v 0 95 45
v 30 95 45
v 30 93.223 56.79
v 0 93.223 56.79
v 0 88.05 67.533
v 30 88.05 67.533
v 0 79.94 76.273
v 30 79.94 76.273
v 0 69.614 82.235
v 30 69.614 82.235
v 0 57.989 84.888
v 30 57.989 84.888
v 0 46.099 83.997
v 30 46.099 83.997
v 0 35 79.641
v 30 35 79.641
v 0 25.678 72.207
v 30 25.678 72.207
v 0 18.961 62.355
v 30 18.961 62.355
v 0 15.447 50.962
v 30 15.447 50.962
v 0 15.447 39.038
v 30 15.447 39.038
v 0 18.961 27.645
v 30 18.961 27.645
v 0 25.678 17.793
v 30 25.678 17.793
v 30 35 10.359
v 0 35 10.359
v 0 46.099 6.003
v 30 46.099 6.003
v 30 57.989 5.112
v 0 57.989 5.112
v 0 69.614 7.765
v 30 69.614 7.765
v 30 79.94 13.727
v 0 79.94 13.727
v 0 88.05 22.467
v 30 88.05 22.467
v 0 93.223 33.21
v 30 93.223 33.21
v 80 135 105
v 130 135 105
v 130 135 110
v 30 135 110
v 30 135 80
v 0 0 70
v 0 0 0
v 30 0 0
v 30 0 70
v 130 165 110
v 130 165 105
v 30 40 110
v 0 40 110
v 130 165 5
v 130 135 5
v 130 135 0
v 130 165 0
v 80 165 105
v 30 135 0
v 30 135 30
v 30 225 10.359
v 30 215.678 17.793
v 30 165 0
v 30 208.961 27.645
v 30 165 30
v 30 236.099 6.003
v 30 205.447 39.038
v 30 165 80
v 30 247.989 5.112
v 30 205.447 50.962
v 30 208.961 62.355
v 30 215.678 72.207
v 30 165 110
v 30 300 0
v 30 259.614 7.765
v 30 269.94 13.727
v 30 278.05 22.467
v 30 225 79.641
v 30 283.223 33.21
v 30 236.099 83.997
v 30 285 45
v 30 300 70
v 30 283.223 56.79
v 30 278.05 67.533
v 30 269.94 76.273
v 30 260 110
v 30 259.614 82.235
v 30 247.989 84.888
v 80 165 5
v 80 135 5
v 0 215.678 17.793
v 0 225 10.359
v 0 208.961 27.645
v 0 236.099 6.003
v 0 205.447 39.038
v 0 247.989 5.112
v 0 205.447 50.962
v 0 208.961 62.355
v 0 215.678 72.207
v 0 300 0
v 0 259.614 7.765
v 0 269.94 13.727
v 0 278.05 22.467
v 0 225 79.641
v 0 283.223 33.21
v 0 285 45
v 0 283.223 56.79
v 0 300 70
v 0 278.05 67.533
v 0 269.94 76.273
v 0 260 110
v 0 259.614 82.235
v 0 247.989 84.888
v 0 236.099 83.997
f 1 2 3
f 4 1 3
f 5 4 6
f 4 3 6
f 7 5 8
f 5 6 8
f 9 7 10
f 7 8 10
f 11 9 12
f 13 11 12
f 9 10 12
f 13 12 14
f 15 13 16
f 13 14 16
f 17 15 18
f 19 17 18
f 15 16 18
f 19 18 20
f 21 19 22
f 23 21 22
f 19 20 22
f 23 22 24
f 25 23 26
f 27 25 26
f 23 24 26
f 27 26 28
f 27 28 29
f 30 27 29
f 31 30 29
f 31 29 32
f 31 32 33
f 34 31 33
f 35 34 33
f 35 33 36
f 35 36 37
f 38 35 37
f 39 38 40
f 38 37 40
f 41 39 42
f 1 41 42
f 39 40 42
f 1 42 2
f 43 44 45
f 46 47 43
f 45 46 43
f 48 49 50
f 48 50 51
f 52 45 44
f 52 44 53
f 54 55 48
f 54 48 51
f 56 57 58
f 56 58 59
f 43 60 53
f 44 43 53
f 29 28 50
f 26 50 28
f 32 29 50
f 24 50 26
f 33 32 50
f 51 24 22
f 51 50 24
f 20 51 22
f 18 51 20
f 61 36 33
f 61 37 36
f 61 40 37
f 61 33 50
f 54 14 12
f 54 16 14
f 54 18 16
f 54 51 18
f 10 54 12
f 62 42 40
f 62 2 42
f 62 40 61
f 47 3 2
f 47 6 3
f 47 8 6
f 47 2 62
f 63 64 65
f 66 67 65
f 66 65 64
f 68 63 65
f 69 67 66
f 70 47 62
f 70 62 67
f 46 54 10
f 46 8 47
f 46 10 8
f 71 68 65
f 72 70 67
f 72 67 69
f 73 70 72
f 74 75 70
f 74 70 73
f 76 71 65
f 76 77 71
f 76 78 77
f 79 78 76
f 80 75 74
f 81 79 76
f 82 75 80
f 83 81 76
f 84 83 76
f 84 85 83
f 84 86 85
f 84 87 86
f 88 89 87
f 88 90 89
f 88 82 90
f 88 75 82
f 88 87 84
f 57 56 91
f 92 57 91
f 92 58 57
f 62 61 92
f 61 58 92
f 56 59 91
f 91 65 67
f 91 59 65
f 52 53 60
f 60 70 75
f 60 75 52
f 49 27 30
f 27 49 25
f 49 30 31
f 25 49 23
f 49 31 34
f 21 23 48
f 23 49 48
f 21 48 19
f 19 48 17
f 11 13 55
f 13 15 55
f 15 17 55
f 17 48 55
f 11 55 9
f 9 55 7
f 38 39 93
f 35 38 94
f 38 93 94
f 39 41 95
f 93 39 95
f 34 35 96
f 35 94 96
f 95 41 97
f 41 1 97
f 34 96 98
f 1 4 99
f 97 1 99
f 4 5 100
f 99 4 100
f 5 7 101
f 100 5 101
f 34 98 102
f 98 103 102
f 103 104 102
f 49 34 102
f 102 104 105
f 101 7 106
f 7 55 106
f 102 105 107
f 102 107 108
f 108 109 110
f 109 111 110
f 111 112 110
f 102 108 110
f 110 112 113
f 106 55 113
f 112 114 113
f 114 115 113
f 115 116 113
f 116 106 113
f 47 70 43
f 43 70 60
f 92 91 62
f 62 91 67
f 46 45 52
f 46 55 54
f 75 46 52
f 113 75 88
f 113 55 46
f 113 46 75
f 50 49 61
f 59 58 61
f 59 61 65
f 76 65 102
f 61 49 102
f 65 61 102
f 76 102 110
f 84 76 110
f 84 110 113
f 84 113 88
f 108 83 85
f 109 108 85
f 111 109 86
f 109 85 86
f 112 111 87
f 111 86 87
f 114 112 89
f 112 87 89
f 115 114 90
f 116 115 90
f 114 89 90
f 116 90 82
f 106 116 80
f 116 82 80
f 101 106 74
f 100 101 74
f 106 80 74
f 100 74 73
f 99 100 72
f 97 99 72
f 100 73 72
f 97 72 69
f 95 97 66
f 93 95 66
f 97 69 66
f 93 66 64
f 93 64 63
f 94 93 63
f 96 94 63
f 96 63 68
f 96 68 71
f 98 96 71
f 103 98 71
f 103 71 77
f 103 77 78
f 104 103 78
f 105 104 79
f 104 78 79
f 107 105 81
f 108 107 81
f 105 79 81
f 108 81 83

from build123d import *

# Parameters (mm, degrees)
F0_W     = 300
F0_H     = 110
F1_DEPTH = 30
F2_R     = 40
F3_DEPTH = 30
F4_W     = 30
F4_H     = 30
F5_DEPTH = 100
F7_DEPTH = 30
F8_SIZE  = 40


with BuildPart() as f1:
    # F0 (on Right) → F1 (new body)
    with BuildSketch(Plane.YZ):
        with Locations((150, 55)):
            Rectangle(F0_W, F0_H)
    extrude(amount=F1_DEPTH)

    # F2 (on face) → F3 (cut, through all)
    with BuildSketch(Plane.YZ.offset(30)):
        with Locations((55, 45)):
            Circle(F2_R)
        with Locations((245, 45)):
            Circle(F2_R)
    extrude(amount=-F3_DEPTH, mode=Mode.SUBTRACT)

    # F4 (on face) → F5 (join)
    with BuildSketch(Plane.YZ.offset(30)):
        with Locations((150, 95)):
            Rectangle(F4_W, F4_H)
        with Locations((150, 15)):
            Rectangle(F4_W, F4_H)
    extrude(amount=F5_DEPTH)

    # F6 (on face) → F7 (cut, through all)
    with BuildSketch(Plane(origin=(0, 165, 0), x_dir=(-1, 0, 0), z_dir=(0, 1, 0))):
        Polygon((-80, 105), (-130, 105), (-130, 80), (-30, 80), align=None)
        Polygon((-30, 30), (-130, 30), (-130, 5), (-80, 5), align=None)
    extrude(amount=-F7_DEPTH, mode=Mode.SUBTRACT)

    # F8
    f8_edges = [f1.edges().sort_by_distance(p)[0] for p in [
        (15, 0, 110),
        (15, 300, 110),
    ]]
    chamfer(f8_edges, length=F8_SIZE)


solid = f1.part
